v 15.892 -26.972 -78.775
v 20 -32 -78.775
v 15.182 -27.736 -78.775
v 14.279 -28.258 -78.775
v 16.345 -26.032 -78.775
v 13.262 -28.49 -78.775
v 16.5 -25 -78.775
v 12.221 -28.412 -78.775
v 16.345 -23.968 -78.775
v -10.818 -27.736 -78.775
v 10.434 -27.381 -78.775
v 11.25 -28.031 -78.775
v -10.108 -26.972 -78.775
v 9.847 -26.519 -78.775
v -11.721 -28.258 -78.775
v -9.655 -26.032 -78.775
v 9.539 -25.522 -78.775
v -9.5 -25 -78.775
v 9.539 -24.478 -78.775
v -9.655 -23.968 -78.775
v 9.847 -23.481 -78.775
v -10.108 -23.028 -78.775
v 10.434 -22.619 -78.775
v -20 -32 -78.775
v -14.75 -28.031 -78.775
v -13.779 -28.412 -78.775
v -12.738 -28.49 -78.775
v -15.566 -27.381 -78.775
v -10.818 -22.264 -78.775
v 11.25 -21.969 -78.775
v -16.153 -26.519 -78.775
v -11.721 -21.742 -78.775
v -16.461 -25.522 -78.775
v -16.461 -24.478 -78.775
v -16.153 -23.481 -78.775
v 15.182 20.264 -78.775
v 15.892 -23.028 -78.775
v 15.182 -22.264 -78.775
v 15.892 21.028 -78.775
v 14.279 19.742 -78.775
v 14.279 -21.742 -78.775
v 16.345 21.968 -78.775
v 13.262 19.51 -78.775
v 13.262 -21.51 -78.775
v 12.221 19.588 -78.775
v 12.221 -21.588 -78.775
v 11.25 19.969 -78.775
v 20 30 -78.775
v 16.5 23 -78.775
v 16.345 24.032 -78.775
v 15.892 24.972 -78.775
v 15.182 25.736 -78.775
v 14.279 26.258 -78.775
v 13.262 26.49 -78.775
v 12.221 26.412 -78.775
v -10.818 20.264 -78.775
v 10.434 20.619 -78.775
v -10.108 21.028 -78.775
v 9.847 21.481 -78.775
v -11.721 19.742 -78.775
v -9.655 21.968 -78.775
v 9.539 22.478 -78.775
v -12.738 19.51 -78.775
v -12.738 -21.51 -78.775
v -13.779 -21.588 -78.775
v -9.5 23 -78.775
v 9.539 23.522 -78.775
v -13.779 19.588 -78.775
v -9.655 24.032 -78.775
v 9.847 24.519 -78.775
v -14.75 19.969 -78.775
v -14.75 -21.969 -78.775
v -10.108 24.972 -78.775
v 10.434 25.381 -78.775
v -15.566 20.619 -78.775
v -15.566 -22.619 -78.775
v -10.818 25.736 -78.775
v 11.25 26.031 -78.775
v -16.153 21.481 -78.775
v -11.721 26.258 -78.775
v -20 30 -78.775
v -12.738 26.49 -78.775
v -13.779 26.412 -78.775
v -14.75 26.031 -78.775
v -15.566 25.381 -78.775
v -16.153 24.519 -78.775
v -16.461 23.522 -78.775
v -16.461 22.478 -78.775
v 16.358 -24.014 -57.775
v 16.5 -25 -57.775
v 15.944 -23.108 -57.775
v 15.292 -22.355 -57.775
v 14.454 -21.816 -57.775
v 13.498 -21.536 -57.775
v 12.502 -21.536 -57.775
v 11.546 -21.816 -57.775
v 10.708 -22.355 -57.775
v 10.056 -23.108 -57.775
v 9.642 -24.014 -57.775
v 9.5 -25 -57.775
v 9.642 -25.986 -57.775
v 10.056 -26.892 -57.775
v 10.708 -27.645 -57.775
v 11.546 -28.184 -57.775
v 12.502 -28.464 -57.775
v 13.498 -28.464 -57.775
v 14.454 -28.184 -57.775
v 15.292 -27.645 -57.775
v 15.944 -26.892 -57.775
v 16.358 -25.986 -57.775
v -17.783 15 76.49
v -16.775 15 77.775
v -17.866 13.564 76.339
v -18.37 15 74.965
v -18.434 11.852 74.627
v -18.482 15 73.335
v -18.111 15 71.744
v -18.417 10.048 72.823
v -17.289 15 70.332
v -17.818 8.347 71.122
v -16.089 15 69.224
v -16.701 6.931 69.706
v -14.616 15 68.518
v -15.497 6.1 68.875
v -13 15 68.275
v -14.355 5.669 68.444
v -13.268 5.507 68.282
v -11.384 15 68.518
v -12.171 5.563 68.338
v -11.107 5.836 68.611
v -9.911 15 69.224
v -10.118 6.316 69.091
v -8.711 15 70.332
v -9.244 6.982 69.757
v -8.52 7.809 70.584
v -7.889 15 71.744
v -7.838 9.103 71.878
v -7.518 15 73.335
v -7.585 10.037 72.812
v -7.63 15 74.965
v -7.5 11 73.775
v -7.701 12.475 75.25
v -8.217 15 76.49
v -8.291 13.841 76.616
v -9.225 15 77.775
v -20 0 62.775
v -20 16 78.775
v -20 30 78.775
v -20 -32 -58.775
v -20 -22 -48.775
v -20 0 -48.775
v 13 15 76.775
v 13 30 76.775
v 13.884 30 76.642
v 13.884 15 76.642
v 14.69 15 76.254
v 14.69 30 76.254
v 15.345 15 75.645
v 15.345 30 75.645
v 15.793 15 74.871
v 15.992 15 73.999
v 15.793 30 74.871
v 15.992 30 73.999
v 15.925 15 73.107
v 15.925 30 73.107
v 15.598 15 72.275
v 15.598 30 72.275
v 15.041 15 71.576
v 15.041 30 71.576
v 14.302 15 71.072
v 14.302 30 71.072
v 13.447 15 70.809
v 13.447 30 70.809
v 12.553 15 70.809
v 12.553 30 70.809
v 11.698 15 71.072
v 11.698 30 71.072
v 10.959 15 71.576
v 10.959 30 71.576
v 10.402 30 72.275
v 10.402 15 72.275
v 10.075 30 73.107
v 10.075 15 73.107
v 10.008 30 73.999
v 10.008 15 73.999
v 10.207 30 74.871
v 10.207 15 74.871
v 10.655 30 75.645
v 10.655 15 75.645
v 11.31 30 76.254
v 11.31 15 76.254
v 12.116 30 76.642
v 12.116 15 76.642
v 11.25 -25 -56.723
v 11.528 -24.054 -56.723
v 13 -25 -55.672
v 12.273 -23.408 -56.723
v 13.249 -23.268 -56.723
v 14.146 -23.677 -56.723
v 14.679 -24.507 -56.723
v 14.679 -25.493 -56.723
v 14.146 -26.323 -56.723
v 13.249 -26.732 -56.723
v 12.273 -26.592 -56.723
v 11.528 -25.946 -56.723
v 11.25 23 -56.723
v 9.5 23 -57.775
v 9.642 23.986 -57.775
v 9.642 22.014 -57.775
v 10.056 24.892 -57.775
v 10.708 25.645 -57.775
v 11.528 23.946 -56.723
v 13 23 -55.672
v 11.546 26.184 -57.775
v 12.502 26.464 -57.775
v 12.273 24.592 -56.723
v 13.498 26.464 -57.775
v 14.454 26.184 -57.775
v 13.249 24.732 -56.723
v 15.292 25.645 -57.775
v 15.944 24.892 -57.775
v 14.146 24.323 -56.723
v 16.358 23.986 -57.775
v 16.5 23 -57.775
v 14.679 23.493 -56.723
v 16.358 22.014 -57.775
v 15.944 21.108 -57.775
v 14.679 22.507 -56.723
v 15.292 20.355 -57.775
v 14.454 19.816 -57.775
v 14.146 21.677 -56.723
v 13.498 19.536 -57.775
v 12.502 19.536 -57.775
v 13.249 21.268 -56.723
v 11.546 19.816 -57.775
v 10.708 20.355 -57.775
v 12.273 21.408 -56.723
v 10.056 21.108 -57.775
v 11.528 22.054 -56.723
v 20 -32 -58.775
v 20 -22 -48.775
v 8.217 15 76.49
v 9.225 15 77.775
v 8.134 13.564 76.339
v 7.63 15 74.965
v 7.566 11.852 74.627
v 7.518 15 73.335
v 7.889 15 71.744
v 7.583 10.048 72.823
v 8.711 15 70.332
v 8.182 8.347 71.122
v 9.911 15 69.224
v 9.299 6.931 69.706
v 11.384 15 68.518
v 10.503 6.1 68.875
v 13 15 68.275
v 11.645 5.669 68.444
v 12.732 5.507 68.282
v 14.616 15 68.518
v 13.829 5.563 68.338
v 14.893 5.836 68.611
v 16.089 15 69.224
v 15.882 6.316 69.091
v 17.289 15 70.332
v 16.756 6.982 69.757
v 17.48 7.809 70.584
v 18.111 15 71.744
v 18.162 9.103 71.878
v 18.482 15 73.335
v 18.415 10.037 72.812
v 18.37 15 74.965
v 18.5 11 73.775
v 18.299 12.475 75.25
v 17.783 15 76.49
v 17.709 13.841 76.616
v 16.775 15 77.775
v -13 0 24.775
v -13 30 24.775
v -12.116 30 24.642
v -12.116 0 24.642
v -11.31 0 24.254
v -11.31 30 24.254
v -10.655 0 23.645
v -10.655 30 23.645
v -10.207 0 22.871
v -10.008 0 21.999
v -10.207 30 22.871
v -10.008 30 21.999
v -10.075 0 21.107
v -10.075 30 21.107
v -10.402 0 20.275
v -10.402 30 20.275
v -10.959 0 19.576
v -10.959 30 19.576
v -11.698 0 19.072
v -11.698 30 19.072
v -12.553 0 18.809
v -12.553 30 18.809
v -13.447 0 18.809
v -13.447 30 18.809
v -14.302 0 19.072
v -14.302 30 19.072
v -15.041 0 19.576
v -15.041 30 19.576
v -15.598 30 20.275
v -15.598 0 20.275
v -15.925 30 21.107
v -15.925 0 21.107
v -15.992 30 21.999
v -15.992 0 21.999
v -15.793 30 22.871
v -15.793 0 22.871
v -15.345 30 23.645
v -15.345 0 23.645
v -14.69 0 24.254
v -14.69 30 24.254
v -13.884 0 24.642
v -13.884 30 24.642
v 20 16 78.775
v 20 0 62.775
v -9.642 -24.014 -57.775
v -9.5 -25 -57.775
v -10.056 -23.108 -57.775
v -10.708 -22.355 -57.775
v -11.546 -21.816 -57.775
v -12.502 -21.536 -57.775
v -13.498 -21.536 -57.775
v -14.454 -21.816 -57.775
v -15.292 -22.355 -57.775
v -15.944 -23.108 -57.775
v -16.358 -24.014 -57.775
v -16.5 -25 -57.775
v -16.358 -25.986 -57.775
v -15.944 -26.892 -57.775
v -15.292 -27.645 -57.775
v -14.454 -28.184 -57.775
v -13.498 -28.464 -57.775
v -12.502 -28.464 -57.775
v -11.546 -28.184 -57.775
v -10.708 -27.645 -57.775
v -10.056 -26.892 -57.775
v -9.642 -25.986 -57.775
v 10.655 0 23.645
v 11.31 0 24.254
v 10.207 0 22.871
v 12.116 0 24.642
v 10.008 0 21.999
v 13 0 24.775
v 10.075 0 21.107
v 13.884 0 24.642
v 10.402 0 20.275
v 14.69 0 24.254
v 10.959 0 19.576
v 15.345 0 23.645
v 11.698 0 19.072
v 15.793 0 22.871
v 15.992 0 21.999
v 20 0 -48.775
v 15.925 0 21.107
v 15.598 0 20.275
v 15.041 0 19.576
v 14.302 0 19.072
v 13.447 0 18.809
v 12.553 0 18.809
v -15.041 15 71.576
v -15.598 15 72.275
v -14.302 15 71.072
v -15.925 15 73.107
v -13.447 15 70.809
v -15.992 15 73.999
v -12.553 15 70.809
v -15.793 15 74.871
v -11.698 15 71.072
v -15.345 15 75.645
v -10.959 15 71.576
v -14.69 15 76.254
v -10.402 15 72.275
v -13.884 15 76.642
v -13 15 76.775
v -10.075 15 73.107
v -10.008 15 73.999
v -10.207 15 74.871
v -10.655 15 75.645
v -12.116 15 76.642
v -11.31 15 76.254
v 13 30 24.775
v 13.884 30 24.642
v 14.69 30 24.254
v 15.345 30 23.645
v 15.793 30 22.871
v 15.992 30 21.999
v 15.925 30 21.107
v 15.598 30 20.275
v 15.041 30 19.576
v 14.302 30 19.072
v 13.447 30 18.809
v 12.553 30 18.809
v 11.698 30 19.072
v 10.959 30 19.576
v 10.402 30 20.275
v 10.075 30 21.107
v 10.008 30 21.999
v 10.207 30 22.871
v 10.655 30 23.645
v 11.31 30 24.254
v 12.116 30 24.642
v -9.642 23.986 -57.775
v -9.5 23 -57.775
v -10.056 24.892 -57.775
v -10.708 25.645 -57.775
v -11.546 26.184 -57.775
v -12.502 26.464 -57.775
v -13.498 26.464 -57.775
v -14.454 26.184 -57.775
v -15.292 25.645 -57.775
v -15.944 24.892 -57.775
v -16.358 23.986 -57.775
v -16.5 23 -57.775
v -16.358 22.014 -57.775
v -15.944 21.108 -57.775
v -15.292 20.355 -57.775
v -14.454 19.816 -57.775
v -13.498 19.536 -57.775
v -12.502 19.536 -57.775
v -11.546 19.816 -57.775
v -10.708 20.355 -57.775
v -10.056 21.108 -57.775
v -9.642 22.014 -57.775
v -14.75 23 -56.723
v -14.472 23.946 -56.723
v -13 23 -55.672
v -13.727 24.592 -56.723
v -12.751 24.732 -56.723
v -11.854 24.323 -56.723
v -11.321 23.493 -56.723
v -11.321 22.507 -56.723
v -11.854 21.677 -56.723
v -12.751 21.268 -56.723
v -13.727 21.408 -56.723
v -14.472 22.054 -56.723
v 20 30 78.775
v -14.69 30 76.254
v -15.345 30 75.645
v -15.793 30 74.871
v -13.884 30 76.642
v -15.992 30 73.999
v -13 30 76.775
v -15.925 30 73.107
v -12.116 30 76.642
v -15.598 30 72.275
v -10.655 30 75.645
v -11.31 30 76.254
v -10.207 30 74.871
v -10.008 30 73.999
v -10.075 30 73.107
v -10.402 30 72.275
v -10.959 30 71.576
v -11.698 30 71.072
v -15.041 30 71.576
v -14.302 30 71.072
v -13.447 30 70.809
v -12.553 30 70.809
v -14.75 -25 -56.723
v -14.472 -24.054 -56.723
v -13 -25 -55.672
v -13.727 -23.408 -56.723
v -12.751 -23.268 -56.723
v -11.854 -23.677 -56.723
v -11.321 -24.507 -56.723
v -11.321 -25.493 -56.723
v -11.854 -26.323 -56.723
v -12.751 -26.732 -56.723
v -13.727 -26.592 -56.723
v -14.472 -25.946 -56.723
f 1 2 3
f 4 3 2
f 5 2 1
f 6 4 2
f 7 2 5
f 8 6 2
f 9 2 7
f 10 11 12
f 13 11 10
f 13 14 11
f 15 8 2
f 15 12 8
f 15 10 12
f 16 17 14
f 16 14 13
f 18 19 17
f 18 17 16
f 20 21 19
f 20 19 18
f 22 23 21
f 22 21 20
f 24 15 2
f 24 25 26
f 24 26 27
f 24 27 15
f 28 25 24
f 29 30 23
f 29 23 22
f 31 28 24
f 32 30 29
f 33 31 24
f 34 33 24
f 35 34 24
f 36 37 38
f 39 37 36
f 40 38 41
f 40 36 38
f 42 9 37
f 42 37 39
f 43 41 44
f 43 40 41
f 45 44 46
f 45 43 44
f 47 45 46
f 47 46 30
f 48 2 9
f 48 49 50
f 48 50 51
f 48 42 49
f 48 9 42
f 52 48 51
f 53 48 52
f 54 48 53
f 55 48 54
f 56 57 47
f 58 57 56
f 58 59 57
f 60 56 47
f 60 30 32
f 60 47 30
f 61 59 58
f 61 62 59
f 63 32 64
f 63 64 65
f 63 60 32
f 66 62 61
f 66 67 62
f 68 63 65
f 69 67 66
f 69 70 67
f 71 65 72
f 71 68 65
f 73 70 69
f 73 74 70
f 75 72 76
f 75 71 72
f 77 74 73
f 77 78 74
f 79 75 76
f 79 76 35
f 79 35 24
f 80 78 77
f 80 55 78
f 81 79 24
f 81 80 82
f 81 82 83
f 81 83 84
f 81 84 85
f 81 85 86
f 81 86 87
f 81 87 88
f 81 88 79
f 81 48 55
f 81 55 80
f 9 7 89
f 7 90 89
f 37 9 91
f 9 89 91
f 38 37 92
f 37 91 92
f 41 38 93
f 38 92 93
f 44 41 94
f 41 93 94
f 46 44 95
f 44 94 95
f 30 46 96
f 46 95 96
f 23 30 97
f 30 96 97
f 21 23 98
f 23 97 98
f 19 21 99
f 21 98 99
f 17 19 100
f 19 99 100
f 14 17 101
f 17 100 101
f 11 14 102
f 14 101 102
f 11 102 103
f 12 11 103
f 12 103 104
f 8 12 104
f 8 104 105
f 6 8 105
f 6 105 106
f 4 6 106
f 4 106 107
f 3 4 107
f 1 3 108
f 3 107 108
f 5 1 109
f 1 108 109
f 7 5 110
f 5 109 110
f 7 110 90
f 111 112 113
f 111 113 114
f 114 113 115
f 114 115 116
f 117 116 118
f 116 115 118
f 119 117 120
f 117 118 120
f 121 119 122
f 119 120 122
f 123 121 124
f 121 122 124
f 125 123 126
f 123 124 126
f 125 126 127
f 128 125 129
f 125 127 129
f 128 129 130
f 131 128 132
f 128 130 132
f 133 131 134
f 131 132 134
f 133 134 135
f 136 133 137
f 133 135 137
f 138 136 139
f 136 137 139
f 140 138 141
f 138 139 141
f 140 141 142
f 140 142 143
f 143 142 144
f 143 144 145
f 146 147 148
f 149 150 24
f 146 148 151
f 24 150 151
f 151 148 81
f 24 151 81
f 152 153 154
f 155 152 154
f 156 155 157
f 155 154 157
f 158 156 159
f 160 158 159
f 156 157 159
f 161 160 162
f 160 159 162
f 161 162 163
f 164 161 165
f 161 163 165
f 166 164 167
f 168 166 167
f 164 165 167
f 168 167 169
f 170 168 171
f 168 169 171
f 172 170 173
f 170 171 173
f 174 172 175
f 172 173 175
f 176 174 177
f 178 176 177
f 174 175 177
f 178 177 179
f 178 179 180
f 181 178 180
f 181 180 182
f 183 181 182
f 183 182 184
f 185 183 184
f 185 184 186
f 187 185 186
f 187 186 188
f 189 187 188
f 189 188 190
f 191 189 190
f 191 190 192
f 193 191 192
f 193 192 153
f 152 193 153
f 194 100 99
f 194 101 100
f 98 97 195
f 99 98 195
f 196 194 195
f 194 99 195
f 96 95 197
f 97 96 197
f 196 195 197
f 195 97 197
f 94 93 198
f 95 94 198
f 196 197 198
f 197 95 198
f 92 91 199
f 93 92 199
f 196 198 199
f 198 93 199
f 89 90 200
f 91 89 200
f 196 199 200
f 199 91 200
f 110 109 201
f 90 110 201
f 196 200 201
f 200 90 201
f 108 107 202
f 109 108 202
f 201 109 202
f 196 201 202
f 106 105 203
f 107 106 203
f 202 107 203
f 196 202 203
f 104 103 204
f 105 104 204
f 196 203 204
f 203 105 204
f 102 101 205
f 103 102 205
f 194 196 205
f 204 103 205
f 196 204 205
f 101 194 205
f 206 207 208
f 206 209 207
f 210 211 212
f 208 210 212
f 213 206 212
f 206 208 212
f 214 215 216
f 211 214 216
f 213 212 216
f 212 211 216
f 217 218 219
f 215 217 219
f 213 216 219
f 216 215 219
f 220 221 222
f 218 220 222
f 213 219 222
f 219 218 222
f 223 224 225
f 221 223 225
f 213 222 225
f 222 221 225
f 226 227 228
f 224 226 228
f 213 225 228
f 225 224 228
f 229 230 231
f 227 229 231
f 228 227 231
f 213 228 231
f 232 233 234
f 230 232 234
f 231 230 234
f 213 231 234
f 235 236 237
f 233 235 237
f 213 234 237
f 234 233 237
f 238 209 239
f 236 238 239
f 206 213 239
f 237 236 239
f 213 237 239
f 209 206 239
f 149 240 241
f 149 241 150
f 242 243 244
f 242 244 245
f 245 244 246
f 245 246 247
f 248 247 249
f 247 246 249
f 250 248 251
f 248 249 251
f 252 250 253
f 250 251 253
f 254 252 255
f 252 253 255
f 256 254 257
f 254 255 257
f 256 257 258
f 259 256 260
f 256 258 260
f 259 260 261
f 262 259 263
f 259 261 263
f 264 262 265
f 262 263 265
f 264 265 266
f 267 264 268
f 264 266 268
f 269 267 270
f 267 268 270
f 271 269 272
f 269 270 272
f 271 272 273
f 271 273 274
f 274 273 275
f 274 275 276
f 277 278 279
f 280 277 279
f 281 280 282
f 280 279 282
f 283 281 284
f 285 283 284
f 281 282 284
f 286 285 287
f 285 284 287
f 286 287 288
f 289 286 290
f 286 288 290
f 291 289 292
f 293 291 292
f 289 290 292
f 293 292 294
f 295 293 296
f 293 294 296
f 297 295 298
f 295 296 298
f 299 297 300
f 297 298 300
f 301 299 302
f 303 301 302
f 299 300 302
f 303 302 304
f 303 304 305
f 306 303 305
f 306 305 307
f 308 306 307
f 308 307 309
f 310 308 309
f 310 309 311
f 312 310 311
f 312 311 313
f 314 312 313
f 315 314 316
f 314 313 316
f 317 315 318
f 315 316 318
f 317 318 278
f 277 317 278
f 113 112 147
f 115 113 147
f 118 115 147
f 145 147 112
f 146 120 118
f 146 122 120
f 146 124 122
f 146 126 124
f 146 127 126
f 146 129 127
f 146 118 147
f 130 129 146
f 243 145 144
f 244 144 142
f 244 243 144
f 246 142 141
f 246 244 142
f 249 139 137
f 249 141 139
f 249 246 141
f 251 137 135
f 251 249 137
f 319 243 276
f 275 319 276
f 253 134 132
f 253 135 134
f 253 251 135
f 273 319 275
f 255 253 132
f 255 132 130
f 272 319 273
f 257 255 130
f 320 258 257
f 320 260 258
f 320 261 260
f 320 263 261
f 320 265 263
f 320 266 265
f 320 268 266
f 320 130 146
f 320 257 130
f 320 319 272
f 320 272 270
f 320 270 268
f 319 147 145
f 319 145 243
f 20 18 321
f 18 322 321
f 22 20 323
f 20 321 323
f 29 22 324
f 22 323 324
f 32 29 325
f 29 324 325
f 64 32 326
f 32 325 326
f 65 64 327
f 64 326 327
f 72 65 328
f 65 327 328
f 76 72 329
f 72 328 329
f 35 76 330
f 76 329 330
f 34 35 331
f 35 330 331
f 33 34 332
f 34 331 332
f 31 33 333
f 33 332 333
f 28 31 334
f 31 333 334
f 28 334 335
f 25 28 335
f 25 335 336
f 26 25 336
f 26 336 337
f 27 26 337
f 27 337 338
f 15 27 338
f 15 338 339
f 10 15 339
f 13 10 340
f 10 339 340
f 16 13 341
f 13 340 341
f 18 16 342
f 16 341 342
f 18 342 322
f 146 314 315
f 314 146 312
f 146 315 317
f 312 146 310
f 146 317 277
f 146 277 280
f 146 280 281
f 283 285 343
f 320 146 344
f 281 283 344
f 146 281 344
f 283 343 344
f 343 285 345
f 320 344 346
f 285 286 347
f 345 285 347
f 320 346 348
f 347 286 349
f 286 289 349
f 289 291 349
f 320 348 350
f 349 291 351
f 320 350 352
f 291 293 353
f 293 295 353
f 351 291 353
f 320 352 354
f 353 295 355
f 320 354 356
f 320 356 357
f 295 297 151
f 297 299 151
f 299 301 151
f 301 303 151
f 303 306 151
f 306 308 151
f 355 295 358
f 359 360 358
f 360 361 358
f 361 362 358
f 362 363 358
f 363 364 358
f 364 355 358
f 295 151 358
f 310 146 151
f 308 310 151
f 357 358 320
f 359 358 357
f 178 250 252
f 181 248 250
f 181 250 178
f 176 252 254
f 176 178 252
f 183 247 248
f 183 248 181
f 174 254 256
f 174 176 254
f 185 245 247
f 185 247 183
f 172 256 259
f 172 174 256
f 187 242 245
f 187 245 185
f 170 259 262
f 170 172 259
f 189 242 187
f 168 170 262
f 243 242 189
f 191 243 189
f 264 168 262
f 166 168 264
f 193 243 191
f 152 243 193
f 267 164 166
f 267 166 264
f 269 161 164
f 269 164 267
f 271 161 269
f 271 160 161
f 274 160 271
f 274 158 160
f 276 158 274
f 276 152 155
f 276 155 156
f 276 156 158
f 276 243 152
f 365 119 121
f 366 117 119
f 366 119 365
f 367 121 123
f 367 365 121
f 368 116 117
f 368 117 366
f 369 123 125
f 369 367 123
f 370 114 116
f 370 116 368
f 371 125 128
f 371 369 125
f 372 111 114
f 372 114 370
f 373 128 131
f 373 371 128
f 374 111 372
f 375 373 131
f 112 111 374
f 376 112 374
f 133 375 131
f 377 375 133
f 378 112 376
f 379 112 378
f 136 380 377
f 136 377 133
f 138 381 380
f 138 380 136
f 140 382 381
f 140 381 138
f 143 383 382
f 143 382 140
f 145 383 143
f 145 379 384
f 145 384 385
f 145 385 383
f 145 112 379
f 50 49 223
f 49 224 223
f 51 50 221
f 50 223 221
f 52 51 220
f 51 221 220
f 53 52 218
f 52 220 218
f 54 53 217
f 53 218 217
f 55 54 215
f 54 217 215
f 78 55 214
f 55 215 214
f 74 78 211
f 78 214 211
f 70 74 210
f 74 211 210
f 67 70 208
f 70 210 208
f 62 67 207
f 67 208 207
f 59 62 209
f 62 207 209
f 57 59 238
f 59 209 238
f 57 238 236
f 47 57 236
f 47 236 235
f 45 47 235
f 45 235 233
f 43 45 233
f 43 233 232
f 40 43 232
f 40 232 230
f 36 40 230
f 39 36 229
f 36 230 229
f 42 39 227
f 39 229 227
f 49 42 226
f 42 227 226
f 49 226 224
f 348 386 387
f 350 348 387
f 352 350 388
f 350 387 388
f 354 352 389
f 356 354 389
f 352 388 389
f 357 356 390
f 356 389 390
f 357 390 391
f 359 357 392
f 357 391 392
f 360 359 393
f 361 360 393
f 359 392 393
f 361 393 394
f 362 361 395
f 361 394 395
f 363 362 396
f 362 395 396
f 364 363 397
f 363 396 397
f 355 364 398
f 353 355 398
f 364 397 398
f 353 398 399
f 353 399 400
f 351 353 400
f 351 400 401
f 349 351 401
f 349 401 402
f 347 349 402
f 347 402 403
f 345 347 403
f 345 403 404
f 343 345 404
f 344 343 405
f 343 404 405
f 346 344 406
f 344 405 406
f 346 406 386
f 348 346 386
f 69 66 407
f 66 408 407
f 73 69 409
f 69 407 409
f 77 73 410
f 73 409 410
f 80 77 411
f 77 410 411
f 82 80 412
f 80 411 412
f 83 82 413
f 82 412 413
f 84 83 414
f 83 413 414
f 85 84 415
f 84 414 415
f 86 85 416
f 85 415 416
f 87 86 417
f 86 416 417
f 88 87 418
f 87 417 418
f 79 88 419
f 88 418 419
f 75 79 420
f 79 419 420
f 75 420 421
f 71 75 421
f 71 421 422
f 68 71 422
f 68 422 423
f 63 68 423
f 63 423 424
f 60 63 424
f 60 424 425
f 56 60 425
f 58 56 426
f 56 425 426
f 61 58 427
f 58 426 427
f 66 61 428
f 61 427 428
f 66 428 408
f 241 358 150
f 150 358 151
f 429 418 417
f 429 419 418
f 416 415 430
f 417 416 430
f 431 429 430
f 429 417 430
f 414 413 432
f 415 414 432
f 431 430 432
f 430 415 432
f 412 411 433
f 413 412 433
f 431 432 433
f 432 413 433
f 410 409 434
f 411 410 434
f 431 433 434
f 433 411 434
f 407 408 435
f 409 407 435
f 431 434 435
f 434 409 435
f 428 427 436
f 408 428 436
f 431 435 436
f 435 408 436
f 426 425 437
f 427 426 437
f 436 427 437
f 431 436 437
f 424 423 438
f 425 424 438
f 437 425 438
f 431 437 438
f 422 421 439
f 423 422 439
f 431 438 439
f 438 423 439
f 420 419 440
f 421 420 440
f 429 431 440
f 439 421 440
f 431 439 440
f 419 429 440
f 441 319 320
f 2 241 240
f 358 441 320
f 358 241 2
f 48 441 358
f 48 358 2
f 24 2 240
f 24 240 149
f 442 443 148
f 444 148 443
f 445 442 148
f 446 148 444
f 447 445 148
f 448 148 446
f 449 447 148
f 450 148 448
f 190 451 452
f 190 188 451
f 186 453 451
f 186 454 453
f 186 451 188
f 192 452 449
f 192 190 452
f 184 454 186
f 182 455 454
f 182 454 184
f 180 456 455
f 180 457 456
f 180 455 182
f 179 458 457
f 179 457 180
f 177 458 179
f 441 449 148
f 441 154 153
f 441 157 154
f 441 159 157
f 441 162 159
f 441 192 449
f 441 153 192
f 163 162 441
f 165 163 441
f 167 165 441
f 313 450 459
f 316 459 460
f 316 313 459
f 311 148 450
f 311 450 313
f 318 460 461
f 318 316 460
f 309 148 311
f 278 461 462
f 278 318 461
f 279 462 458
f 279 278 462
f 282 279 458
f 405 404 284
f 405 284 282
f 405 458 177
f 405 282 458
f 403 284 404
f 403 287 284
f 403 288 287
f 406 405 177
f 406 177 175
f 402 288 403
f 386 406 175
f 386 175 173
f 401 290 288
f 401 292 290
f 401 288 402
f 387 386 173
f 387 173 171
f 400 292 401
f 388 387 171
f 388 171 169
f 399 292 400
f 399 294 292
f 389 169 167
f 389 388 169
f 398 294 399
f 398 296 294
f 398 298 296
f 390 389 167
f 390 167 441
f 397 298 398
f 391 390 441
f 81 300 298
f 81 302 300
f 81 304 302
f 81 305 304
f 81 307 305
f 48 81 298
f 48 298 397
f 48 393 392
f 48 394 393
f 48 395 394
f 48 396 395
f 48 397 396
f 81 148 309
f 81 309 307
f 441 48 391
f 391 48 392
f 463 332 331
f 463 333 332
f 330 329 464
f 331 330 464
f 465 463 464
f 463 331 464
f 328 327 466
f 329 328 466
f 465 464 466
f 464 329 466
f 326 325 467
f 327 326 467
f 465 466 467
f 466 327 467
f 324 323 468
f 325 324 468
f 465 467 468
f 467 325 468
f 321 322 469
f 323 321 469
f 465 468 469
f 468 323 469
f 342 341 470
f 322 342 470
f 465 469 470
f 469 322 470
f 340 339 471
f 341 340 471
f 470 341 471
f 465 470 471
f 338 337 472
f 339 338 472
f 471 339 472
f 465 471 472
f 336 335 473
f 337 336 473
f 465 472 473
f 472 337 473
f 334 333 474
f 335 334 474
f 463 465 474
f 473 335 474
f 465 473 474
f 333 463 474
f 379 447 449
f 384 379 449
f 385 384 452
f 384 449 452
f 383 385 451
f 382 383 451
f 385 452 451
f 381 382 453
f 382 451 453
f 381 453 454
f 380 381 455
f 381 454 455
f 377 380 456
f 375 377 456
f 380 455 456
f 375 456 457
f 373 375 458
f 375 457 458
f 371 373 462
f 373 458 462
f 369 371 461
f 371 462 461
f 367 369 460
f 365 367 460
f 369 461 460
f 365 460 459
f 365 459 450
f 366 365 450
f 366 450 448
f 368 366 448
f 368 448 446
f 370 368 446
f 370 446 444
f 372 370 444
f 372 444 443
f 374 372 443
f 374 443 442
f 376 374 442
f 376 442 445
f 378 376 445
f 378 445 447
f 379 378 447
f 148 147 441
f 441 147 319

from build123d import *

# Parameters (mm, degrees)
SZKIC1_W                       = 40
SZKIC1_H                       = 157.55
DODANIE_WYCI_GNI_CIE1_DEPTH    = 30
SZKIC2_W                       = 40
SZKIC2_H                       = 30
DODANIE_WYCI_GNI_CIE2_DEPTH    = 32
SZKIC3_R                       = 3
WYTNIJ_WYCI_GNI_CIE1_DEPTH     = 30
SFAZOWANIE1_SIZE               = 16
SZKIC4_R                       = 5.5
WYTNIJ_WYCI_GNI_CIE7_DEPTH     = 15
SFAZOWANIE2_SIZE               = 10
OTW_R_GWINTOWANY_M8X1_01_D     = 7
OTW_R_GWINTOWANY_M8X1_01_DEPTH = 21
OTW_R_GWINTOWANY_M8X1_01_TIP   = 2.103012167


with BuildPart() as part:
    # Szkic1 → Dodanie-wyciągnięcie1 (new body)
    with BuildSketch(Plane(origin=(0, 0, 0), x_dir=(1, 0, 0), z_dir=(0, 1, 0))):
        Rectangle(SZKIC1_W, SZKIC1_H)
    extrude(amount=DODANIE_WYCI_GNI_CIE1_DEPTH)

    # Szkic2 → Dodanie-wyciągnięcie2 (add)
    with BuildSketch(Plane(origin=(0, 0, 0), x_dir=(-1, 0, 0), z_dir=(0, -1, 0))):
        with Locations((0, 63.775)):
            Rectangle(SZKIC2_W, SZKIC2_H)
    extrude(amount=DODANIE_WYCI_GNI_CIE2_DEPTH)

    # Szkic3 → Wytnij-wyciągnięcie1 (cut)
    with BuildSketch(Plane(origin=(0, 30, 0), x_dir=(1, 0, 0), z_dir=(0, 1, 0))):
        with Locations(Location((-13, -73.775, 0), (0, 0, 270))):
            Circle(SZKIC3_R)
        with Locations(Location((13, -73.775, 0), (0, 0, 270))):
            Circle(SZKIC3_R)
        with Locations(Location((13, -21.775, 0), (0, 0, 270))):
            Circle(SZKIC3_R)
        with Locations(Location((-13, -21.775, 0), (0, 0, 270))):
            Circle(SZKIC3_R)
    extrude(amount=-WYTNIJ_WYCI_GNI_CIE1_DEPTH, mode=Mode.SUBTRACT)

    # Sfazowanie1
    # the kernel refuses this chamfer: 16 mm, written as the material it takes off along each edge
    with BuildSketch(Plane(origin=(61.146927807, 0, 78.775), x_dir=(0, 0.9996219169112968, 0.027495876610586494), z_dir=(-1, 0, 0))) as sfazowanie1_piece_1:
        Polygon((SFAZOWANIE1_SIZE * 0.999621916911, SFAZOWANIE1_SIZE * 0.0274958766106), (-SFAZOWANIE1_SIZE * 0.0274958766106, SFAZOWANIE1_SIZE * 0.999621916911), (0, 0), align=None)
    extrude(amount=122.293855615, mode=Mode.SUBTRACT)

    # Szkic4 → Wytnij-wyciągnięcie7 (cut)
    with BuildSketch(Plane.XZ):
        with Locations((13, 73.775)):
            Circle(SZKIC4_R)
        with Locations((-13, 73.775)):
            Circle(SZKIC4_R)
    extrude(amount=-WYTNIJ_WYCI_GNI_CIE7_DEPTH, mode=Mode.SUBTRACT)

    # Sfazowanie2
    sfazowanie2_edges = [part.edges().sort_by_distance(p)[0] for p in [
        (0, -32, -48.775),
    ]]
    chamfer(sfazowanie2_edges, length=SFAZOWANIE2_SIZE)

    # Otwór gwintowany M8x1.01
    with Locations(Plane(origin=(0, 0, -78.775), x_dir=(-1, 0, 0), z_dir=(0, 0, -1))):
        with Locations((-13, -25), (-13, 23), (13, 23), (13, -25)):
            Hole(OTW_R_GWINTOWANY_M8X1_01_D / 2, depth=OTW_R_GWINTOWANY_M8X1_01_DEPTH)
            with Locations((0, 0, -(OTW_R_GWINTOWANY_M8X1_01_DEPTH + OTW_R_GWINTOWANY_M8X1_01_TIP / 2))):  # 118° drill point
                Cone(0, OTW_R_GWINTOWANY_M8X1_01_D / 2, OTW_R_GWINTOWANY_M8X1_01_TIP, mode=Mode.SUBTRACT)


solid = part.part
